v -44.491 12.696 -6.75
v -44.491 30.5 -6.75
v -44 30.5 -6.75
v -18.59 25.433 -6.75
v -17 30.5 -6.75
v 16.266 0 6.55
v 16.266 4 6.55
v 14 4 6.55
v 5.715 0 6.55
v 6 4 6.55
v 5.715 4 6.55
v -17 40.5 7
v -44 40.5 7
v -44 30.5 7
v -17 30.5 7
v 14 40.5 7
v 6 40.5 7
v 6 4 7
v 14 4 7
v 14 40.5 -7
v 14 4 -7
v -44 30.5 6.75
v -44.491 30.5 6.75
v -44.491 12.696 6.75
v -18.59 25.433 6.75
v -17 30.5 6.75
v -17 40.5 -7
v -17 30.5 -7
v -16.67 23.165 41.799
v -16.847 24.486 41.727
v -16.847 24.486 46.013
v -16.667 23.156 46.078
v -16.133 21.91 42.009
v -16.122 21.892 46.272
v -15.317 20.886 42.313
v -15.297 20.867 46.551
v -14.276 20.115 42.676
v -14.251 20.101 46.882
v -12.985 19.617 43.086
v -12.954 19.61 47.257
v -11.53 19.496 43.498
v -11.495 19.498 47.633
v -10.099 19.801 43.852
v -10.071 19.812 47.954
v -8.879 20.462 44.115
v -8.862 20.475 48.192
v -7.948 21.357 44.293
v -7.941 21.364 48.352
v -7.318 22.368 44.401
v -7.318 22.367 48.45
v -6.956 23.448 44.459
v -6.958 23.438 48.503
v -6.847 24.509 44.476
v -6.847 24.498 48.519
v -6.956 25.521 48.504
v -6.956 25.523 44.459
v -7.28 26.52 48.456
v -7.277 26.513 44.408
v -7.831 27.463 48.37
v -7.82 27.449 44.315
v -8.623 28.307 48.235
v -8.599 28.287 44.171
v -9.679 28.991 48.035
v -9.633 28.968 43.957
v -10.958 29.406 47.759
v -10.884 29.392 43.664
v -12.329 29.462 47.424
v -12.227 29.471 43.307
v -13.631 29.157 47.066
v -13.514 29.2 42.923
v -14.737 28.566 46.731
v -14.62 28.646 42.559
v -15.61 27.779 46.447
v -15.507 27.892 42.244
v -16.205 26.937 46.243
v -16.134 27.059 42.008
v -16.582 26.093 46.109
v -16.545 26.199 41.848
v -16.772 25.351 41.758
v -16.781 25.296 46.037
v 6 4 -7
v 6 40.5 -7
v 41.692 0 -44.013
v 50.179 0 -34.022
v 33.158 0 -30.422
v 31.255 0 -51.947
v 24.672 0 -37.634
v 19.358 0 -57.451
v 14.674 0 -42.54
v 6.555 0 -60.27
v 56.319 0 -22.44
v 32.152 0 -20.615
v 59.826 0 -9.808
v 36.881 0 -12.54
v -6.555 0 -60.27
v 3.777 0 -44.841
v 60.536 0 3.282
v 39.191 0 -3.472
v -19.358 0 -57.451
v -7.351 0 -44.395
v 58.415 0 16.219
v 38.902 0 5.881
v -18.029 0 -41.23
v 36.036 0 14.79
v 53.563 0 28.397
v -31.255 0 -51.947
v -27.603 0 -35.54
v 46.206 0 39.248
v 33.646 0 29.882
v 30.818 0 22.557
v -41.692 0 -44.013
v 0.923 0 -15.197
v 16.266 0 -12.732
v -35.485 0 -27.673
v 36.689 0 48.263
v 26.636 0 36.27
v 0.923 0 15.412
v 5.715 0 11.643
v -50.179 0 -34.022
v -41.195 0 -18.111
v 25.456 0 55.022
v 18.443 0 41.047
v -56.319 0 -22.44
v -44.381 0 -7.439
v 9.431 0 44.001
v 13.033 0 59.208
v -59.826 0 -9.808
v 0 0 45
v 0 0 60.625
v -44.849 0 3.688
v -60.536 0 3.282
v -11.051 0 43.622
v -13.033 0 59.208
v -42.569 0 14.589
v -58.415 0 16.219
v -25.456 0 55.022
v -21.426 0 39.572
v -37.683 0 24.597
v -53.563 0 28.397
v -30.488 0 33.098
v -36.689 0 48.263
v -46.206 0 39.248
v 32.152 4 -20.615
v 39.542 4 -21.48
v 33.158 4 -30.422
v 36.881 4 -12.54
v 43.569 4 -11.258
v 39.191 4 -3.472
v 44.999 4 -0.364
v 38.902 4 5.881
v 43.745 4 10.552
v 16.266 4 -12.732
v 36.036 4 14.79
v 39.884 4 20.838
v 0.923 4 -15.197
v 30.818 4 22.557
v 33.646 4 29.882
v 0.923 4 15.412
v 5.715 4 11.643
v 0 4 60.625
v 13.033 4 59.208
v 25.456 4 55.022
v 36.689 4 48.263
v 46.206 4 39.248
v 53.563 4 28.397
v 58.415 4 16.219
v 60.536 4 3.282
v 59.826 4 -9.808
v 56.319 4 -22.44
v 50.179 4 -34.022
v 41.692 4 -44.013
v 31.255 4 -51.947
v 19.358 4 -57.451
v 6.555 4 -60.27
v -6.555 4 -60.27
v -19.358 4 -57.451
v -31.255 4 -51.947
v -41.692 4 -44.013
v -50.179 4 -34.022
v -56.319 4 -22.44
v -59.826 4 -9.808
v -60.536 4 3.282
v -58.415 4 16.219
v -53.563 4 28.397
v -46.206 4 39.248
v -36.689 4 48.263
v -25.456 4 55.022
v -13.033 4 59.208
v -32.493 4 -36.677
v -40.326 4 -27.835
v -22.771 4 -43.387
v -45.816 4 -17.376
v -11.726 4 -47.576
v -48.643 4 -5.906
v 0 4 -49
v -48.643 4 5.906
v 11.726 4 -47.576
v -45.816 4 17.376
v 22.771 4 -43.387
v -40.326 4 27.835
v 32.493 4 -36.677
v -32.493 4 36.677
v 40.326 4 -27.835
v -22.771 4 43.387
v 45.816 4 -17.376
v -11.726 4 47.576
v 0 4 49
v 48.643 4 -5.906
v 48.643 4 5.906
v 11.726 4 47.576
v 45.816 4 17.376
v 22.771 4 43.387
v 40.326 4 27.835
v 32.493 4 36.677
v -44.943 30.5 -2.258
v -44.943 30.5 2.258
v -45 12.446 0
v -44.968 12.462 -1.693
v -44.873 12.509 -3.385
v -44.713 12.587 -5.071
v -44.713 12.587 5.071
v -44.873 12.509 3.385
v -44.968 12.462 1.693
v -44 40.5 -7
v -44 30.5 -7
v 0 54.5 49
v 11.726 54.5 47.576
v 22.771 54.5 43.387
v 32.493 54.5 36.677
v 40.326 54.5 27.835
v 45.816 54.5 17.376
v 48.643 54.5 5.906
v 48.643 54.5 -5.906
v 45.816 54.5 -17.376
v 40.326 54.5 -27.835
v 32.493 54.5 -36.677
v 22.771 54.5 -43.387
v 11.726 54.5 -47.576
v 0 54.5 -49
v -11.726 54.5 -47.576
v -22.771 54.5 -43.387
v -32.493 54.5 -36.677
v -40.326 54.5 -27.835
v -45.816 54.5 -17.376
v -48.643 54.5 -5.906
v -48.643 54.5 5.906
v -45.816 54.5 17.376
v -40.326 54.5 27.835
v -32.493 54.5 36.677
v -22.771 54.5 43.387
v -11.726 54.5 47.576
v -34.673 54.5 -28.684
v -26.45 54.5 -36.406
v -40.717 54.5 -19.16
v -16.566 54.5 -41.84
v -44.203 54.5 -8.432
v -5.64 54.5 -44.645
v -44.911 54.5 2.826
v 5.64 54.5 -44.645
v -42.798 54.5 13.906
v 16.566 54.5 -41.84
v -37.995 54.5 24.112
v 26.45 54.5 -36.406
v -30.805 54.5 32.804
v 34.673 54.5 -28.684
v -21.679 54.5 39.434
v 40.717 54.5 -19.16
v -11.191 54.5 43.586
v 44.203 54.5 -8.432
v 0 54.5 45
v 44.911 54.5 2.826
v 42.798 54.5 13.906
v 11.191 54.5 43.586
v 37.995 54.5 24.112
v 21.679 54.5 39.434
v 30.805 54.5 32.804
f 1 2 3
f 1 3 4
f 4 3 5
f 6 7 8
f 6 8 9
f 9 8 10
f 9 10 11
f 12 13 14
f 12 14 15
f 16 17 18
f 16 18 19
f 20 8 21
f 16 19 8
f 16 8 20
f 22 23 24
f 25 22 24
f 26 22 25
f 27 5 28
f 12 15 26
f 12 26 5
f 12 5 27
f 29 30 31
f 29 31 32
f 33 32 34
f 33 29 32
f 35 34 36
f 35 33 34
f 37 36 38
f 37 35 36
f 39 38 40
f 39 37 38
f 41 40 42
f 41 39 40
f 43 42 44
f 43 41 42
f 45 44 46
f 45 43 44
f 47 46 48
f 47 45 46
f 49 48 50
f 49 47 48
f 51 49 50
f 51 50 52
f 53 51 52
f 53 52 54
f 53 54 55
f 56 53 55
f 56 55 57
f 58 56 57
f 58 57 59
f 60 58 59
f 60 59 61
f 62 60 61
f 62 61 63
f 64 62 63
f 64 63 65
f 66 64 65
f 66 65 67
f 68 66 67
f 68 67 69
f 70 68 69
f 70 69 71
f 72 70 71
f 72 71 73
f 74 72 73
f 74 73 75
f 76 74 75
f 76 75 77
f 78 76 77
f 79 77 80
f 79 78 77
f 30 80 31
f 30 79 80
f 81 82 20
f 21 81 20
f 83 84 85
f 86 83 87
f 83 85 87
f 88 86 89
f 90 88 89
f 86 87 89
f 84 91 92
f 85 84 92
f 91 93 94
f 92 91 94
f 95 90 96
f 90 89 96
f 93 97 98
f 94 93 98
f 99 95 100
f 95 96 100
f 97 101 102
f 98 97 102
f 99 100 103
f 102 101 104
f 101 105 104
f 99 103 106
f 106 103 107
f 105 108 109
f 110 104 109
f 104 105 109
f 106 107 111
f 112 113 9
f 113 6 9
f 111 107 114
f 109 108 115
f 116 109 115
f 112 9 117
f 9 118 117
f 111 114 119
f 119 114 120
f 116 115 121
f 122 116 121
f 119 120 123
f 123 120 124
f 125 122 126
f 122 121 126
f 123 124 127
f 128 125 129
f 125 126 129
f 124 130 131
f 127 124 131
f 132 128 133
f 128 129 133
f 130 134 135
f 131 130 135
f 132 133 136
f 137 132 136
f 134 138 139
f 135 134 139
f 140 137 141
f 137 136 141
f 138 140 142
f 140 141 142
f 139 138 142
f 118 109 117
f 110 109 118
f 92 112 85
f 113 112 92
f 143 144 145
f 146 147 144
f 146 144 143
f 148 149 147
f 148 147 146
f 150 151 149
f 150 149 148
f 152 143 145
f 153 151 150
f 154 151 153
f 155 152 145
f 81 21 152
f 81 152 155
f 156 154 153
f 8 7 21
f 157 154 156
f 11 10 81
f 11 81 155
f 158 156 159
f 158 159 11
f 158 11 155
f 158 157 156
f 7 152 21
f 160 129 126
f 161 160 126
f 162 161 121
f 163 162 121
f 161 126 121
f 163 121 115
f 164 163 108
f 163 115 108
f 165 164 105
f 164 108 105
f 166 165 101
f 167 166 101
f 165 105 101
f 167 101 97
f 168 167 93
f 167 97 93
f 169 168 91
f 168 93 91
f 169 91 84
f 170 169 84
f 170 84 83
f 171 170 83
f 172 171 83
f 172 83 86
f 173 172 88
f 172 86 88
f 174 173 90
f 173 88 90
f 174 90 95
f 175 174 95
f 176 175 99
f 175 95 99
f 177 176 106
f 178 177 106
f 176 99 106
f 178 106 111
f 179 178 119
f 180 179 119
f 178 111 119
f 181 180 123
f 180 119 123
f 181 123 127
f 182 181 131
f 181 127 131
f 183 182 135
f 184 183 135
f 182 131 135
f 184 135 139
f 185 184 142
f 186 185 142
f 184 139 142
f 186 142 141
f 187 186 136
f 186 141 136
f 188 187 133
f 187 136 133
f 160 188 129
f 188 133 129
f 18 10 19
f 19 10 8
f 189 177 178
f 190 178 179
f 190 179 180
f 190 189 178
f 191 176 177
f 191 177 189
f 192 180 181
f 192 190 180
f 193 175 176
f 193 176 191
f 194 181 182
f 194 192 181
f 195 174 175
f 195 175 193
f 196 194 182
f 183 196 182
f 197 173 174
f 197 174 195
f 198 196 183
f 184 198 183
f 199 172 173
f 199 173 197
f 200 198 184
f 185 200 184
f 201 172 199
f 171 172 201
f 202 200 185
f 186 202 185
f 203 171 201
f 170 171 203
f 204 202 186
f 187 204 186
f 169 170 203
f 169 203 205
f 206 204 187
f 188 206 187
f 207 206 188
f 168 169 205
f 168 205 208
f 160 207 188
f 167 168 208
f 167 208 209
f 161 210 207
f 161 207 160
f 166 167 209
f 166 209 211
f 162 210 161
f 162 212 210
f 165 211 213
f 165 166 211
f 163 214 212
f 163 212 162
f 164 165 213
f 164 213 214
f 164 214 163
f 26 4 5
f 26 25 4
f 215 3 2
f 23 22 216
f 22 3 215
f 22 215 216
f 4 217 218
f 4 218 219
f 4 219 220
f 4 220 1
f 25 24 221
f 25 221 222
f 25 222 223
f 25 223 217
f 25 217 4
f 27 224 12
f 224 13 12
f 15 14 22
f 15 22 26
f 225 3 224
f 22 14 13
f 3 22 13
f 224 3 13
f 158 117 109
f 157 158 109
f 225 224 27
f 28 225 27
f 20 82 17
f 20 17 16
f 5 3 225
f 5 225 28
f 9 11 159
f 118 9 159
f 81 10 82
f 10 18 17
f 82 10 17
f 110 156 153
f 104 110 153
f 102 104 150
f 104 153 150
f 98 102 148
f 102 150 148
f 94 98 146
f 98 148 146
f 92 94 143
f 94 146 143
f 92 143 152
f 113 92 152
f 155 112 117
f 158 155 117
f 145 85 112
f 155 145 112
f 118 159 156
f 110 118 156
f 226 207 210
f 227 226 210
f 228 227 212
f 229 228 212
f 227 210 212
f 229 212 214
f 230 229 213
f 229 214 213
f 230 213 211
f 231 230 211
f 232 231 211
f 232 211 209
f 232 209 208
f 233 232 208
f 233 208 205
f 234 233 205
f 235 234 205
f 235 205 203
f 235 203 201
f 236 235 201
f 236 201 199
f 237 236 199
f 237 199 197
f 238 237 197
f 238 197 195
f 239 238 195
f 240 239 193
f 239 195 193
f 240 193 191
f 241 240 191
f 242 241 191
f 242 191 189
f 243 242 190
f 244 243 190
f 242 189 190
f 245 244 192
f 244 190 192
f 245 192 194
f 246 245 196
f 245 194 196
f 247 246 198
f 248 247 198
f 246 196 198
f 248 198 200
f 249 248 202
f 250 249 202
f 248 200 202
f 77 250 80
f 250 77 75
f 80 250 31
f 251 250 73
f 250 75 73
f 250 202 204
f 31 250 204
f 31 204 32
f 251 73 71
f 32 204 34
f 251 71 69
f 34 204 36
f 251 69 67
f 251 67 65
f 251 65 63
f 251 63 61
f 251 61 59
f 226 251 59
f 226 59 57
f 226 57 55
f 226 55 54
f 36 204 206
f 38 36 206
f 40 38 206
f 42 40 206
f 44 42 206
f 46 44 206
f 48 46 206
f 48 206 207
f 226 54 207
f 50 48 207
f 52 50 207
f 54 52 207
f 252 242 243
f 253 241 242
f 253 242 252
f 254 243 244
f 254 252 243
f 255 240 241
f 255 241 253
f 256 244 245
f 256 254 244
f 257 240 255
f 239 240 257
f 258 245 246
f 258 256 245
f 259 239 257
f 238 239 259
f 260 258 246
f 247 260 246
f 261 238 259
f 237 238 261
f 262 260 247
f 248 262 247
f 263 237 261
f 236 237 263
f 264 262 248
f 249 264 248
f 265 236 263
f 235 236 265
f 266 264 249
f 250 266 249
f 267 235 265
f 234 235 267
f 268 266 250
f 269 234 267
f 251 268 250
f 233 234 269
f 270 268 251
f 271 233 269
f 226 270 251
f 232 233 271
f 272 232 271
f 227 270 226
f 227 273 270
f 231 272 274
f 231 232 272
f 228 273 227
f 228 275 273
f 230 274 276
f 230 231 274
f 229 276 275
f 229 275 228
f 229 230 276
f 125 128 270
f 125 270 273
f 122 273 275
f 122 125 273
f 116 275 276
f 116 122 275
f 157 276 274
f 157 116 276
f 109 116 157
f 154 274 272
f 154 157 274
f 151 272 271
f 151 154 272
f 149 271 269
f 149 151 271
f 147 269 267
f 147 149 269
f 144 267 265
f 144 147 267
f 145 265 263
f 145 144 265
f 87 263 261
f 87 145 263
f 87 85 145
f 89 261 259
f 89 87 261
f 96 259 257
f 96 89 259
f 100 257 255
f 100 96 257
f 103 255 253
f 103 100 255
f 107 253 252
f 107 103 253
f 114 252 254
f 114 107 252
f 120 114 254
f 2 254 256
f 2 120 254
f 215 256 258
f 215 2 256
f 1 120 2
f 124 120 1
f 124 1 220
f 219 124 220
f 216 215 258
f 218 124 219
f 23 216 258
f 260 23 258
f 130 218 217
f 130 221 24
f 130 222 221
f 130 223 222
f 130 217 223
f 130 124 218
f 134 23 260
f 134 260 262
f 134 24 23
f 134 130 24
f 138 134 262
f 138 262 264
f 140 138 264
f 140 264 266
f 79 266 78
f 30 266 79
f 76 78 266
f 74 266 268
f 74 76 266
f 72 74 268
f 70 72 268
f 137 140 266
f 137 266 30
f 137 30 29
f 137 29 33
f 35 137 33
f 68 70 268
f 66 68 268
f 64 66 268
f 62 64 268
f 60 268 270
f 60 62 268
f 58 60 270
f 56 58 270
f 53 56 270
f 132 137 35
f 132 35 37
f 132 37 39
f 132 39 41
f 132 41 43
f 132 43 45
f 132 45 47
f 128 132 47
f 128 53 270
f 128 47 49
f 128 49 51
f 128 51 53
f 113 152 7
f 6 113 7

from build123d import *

# Parameters (mm, degrees)
SKETCH1_R             = 60.625
SKETCH1_R_2           = 45
BOSS_EXTRUDE1_DEPTH   = 4
SKETCH2_R             = 49
SKETCH2_R_2           = 45
BOSS_EXTRUDE2_DEPTH   = 50.5
SKETCH4_W             = 8
SKETCH4_H             = 40.5
BOSS_EXTRUDE4_DEPTH   = 7
SKETCH4_W_2           = 27
SKETCH4_H_2           = 10
BOSS_EXTRUDE4_2_DEPTH = 7
BOSS_EXTRUDE5_DEPTH   = 4
SKETCH6_R             = 5
CUT_EXTRUDE2_DEPTH    = 52
CUT_EXTRUDE6_DEPTH    = 100.503925853
BOSS_EXTRUDE6_DEPTH   = 6.75


with BuildPart() as part:
    # Sketch1 → Boss-Extrude1 (new body)
    with BuildSketch(Plane(origin=(0, 0, 0), x_dir=(1, 0, 0), z_dir=(0, 1, 0))):
        with Locations(Location((0, 0, 0), (0, 0, 270))):
            Circle(SKETCH1_R)
        with Locations(Location((0, 0, 0), (0, 0, 270))):
            Circle(SKETCH1_R_2, mode=Mode.SUBTRACT)
    extrude(amount=BOSS_EXTRUDE1_DEPTH)

    # Sketch2 → Boss-Extrude2 (add)
    with BuildSketch(Plane(origin=(0, 4, 0), x_dir=(1, 0, 0), z_dir=(0, 1, 0))):
        with Locations(Location((0, 0, 0), (0, 0, 270))):
            Circle(SKETCH2_R)
        with Locations(Location((0, 0, 0), (0, 0, 270))):
            Circle(SKETCH2_R_2, mode=Mode.SUBTRACT)
    extrude(amount=BOSS_EXTRUDE2_DEPTH)



with BuildPart() as body_2:
    # Sketch4 → Boss-Extrude4 (new, symmetric)
    with BuildSketch(Plane.XY):
        with Locations((10, 20.25)):
            Rectangle(SKETCH4_W, SKETCH4_H)
    extrude(amount=BOSS_EXTRUDE4_DEPTH, both=True)


with BuildPart() as body_3:
    # Sketch4 → Boss-Extrude4 2 (new, symmetric)
    with BuildSketch(Plane.XY):
        with Locations((-30.5, 35.5)):
            Rectangle(SKETCH4_W_2, SKETCH4_H_2)
    extrude(amount=BOSS_EXTRUDE4_2_DEPTH, both=True)


with BuildPart() as part_1:
    add(part.part)

    add(body_2.part)  # Boss-Extrude5 merges body 2
    # Sketch5 → Boss-Extrude5 (add)
    with BuildSketch(Plane(origin=(0, 0, 0.832419338), x_dir=(1, 0, 0), z_dir=(0, -1, 0))):
        with BuildLine():
            Line((0.92268666, 14.579552818), (36.10584122, 30.137929754))
            ThreePointArc((36.10584122, 30.137929754), (47.46850162, -1.287411864), (36.651216878, -32.904630242))
            Line((36.651216878, -32.904630242), (0.92268666, -16.029114558))
            Line((0.92268666, -16.029114558), (0.92268666, 14.579552818))
        make_face()
    extrude(amount=-BOSS_EXTRUDE5_DEPTH)

    # Sketch6 → Cut-Extrude2 (cut)
    with BuildSketch(Plane.XY):
        with Locations(Location((-11.847358964, 24.485616242, 0), (0, 0, 180))):
            Circle(SKETCH6_R)
    extrude(amount=CUT_EXTRUDE2_DEPTH, mode=Mode.SUBTRACT)

    # Sketch11 → Cut-Extrude6 (cut, through all)
    with BuildSketch(Plane(origin=(0, 4, 0), x_dir=(1, 0, 0), z_dir=(0, 1, 0))):
        with BuildLine():
            Line((16.265526008, 12.732401326), (16.265526008, -6.549664017))
            Line((16.265526008, -6.549664017), (5.714961953, -6.549664017))
            Line((5.714961953, -6.549664017), (5.714961953, -11.643039768))
            Line((5.714961953, -11.643039768), (30.818028154, -22.557416377))
            ThreePointArc((30.818028154, -22.557416377), (39.374347706, -1.214976289), (32.152007517, 20.615006655))
            Line((32.152007517, 20.615006655), (16.265526008, 12.732401326))
        make_face()
    extrude(amount=-CUT_EXTRUDE6_DEPTH, mode=Mode.SUBTRACT)


    add(body_3.part)  # Boss-Extrude6 merges body 3
    # Sketch17 → Boss-Extrude6 (add, symmetric)
    with BuildSketch(Plane.XY):
        Polygon((-17, 30.5), (-45, 30.5), (-45, 12.445827276), (-18.590132897, 25.433454532), align=None)
    extrude(amount=BOSS_EXTRUDE6_DEPTH, both=True)


solid = part_1.part
